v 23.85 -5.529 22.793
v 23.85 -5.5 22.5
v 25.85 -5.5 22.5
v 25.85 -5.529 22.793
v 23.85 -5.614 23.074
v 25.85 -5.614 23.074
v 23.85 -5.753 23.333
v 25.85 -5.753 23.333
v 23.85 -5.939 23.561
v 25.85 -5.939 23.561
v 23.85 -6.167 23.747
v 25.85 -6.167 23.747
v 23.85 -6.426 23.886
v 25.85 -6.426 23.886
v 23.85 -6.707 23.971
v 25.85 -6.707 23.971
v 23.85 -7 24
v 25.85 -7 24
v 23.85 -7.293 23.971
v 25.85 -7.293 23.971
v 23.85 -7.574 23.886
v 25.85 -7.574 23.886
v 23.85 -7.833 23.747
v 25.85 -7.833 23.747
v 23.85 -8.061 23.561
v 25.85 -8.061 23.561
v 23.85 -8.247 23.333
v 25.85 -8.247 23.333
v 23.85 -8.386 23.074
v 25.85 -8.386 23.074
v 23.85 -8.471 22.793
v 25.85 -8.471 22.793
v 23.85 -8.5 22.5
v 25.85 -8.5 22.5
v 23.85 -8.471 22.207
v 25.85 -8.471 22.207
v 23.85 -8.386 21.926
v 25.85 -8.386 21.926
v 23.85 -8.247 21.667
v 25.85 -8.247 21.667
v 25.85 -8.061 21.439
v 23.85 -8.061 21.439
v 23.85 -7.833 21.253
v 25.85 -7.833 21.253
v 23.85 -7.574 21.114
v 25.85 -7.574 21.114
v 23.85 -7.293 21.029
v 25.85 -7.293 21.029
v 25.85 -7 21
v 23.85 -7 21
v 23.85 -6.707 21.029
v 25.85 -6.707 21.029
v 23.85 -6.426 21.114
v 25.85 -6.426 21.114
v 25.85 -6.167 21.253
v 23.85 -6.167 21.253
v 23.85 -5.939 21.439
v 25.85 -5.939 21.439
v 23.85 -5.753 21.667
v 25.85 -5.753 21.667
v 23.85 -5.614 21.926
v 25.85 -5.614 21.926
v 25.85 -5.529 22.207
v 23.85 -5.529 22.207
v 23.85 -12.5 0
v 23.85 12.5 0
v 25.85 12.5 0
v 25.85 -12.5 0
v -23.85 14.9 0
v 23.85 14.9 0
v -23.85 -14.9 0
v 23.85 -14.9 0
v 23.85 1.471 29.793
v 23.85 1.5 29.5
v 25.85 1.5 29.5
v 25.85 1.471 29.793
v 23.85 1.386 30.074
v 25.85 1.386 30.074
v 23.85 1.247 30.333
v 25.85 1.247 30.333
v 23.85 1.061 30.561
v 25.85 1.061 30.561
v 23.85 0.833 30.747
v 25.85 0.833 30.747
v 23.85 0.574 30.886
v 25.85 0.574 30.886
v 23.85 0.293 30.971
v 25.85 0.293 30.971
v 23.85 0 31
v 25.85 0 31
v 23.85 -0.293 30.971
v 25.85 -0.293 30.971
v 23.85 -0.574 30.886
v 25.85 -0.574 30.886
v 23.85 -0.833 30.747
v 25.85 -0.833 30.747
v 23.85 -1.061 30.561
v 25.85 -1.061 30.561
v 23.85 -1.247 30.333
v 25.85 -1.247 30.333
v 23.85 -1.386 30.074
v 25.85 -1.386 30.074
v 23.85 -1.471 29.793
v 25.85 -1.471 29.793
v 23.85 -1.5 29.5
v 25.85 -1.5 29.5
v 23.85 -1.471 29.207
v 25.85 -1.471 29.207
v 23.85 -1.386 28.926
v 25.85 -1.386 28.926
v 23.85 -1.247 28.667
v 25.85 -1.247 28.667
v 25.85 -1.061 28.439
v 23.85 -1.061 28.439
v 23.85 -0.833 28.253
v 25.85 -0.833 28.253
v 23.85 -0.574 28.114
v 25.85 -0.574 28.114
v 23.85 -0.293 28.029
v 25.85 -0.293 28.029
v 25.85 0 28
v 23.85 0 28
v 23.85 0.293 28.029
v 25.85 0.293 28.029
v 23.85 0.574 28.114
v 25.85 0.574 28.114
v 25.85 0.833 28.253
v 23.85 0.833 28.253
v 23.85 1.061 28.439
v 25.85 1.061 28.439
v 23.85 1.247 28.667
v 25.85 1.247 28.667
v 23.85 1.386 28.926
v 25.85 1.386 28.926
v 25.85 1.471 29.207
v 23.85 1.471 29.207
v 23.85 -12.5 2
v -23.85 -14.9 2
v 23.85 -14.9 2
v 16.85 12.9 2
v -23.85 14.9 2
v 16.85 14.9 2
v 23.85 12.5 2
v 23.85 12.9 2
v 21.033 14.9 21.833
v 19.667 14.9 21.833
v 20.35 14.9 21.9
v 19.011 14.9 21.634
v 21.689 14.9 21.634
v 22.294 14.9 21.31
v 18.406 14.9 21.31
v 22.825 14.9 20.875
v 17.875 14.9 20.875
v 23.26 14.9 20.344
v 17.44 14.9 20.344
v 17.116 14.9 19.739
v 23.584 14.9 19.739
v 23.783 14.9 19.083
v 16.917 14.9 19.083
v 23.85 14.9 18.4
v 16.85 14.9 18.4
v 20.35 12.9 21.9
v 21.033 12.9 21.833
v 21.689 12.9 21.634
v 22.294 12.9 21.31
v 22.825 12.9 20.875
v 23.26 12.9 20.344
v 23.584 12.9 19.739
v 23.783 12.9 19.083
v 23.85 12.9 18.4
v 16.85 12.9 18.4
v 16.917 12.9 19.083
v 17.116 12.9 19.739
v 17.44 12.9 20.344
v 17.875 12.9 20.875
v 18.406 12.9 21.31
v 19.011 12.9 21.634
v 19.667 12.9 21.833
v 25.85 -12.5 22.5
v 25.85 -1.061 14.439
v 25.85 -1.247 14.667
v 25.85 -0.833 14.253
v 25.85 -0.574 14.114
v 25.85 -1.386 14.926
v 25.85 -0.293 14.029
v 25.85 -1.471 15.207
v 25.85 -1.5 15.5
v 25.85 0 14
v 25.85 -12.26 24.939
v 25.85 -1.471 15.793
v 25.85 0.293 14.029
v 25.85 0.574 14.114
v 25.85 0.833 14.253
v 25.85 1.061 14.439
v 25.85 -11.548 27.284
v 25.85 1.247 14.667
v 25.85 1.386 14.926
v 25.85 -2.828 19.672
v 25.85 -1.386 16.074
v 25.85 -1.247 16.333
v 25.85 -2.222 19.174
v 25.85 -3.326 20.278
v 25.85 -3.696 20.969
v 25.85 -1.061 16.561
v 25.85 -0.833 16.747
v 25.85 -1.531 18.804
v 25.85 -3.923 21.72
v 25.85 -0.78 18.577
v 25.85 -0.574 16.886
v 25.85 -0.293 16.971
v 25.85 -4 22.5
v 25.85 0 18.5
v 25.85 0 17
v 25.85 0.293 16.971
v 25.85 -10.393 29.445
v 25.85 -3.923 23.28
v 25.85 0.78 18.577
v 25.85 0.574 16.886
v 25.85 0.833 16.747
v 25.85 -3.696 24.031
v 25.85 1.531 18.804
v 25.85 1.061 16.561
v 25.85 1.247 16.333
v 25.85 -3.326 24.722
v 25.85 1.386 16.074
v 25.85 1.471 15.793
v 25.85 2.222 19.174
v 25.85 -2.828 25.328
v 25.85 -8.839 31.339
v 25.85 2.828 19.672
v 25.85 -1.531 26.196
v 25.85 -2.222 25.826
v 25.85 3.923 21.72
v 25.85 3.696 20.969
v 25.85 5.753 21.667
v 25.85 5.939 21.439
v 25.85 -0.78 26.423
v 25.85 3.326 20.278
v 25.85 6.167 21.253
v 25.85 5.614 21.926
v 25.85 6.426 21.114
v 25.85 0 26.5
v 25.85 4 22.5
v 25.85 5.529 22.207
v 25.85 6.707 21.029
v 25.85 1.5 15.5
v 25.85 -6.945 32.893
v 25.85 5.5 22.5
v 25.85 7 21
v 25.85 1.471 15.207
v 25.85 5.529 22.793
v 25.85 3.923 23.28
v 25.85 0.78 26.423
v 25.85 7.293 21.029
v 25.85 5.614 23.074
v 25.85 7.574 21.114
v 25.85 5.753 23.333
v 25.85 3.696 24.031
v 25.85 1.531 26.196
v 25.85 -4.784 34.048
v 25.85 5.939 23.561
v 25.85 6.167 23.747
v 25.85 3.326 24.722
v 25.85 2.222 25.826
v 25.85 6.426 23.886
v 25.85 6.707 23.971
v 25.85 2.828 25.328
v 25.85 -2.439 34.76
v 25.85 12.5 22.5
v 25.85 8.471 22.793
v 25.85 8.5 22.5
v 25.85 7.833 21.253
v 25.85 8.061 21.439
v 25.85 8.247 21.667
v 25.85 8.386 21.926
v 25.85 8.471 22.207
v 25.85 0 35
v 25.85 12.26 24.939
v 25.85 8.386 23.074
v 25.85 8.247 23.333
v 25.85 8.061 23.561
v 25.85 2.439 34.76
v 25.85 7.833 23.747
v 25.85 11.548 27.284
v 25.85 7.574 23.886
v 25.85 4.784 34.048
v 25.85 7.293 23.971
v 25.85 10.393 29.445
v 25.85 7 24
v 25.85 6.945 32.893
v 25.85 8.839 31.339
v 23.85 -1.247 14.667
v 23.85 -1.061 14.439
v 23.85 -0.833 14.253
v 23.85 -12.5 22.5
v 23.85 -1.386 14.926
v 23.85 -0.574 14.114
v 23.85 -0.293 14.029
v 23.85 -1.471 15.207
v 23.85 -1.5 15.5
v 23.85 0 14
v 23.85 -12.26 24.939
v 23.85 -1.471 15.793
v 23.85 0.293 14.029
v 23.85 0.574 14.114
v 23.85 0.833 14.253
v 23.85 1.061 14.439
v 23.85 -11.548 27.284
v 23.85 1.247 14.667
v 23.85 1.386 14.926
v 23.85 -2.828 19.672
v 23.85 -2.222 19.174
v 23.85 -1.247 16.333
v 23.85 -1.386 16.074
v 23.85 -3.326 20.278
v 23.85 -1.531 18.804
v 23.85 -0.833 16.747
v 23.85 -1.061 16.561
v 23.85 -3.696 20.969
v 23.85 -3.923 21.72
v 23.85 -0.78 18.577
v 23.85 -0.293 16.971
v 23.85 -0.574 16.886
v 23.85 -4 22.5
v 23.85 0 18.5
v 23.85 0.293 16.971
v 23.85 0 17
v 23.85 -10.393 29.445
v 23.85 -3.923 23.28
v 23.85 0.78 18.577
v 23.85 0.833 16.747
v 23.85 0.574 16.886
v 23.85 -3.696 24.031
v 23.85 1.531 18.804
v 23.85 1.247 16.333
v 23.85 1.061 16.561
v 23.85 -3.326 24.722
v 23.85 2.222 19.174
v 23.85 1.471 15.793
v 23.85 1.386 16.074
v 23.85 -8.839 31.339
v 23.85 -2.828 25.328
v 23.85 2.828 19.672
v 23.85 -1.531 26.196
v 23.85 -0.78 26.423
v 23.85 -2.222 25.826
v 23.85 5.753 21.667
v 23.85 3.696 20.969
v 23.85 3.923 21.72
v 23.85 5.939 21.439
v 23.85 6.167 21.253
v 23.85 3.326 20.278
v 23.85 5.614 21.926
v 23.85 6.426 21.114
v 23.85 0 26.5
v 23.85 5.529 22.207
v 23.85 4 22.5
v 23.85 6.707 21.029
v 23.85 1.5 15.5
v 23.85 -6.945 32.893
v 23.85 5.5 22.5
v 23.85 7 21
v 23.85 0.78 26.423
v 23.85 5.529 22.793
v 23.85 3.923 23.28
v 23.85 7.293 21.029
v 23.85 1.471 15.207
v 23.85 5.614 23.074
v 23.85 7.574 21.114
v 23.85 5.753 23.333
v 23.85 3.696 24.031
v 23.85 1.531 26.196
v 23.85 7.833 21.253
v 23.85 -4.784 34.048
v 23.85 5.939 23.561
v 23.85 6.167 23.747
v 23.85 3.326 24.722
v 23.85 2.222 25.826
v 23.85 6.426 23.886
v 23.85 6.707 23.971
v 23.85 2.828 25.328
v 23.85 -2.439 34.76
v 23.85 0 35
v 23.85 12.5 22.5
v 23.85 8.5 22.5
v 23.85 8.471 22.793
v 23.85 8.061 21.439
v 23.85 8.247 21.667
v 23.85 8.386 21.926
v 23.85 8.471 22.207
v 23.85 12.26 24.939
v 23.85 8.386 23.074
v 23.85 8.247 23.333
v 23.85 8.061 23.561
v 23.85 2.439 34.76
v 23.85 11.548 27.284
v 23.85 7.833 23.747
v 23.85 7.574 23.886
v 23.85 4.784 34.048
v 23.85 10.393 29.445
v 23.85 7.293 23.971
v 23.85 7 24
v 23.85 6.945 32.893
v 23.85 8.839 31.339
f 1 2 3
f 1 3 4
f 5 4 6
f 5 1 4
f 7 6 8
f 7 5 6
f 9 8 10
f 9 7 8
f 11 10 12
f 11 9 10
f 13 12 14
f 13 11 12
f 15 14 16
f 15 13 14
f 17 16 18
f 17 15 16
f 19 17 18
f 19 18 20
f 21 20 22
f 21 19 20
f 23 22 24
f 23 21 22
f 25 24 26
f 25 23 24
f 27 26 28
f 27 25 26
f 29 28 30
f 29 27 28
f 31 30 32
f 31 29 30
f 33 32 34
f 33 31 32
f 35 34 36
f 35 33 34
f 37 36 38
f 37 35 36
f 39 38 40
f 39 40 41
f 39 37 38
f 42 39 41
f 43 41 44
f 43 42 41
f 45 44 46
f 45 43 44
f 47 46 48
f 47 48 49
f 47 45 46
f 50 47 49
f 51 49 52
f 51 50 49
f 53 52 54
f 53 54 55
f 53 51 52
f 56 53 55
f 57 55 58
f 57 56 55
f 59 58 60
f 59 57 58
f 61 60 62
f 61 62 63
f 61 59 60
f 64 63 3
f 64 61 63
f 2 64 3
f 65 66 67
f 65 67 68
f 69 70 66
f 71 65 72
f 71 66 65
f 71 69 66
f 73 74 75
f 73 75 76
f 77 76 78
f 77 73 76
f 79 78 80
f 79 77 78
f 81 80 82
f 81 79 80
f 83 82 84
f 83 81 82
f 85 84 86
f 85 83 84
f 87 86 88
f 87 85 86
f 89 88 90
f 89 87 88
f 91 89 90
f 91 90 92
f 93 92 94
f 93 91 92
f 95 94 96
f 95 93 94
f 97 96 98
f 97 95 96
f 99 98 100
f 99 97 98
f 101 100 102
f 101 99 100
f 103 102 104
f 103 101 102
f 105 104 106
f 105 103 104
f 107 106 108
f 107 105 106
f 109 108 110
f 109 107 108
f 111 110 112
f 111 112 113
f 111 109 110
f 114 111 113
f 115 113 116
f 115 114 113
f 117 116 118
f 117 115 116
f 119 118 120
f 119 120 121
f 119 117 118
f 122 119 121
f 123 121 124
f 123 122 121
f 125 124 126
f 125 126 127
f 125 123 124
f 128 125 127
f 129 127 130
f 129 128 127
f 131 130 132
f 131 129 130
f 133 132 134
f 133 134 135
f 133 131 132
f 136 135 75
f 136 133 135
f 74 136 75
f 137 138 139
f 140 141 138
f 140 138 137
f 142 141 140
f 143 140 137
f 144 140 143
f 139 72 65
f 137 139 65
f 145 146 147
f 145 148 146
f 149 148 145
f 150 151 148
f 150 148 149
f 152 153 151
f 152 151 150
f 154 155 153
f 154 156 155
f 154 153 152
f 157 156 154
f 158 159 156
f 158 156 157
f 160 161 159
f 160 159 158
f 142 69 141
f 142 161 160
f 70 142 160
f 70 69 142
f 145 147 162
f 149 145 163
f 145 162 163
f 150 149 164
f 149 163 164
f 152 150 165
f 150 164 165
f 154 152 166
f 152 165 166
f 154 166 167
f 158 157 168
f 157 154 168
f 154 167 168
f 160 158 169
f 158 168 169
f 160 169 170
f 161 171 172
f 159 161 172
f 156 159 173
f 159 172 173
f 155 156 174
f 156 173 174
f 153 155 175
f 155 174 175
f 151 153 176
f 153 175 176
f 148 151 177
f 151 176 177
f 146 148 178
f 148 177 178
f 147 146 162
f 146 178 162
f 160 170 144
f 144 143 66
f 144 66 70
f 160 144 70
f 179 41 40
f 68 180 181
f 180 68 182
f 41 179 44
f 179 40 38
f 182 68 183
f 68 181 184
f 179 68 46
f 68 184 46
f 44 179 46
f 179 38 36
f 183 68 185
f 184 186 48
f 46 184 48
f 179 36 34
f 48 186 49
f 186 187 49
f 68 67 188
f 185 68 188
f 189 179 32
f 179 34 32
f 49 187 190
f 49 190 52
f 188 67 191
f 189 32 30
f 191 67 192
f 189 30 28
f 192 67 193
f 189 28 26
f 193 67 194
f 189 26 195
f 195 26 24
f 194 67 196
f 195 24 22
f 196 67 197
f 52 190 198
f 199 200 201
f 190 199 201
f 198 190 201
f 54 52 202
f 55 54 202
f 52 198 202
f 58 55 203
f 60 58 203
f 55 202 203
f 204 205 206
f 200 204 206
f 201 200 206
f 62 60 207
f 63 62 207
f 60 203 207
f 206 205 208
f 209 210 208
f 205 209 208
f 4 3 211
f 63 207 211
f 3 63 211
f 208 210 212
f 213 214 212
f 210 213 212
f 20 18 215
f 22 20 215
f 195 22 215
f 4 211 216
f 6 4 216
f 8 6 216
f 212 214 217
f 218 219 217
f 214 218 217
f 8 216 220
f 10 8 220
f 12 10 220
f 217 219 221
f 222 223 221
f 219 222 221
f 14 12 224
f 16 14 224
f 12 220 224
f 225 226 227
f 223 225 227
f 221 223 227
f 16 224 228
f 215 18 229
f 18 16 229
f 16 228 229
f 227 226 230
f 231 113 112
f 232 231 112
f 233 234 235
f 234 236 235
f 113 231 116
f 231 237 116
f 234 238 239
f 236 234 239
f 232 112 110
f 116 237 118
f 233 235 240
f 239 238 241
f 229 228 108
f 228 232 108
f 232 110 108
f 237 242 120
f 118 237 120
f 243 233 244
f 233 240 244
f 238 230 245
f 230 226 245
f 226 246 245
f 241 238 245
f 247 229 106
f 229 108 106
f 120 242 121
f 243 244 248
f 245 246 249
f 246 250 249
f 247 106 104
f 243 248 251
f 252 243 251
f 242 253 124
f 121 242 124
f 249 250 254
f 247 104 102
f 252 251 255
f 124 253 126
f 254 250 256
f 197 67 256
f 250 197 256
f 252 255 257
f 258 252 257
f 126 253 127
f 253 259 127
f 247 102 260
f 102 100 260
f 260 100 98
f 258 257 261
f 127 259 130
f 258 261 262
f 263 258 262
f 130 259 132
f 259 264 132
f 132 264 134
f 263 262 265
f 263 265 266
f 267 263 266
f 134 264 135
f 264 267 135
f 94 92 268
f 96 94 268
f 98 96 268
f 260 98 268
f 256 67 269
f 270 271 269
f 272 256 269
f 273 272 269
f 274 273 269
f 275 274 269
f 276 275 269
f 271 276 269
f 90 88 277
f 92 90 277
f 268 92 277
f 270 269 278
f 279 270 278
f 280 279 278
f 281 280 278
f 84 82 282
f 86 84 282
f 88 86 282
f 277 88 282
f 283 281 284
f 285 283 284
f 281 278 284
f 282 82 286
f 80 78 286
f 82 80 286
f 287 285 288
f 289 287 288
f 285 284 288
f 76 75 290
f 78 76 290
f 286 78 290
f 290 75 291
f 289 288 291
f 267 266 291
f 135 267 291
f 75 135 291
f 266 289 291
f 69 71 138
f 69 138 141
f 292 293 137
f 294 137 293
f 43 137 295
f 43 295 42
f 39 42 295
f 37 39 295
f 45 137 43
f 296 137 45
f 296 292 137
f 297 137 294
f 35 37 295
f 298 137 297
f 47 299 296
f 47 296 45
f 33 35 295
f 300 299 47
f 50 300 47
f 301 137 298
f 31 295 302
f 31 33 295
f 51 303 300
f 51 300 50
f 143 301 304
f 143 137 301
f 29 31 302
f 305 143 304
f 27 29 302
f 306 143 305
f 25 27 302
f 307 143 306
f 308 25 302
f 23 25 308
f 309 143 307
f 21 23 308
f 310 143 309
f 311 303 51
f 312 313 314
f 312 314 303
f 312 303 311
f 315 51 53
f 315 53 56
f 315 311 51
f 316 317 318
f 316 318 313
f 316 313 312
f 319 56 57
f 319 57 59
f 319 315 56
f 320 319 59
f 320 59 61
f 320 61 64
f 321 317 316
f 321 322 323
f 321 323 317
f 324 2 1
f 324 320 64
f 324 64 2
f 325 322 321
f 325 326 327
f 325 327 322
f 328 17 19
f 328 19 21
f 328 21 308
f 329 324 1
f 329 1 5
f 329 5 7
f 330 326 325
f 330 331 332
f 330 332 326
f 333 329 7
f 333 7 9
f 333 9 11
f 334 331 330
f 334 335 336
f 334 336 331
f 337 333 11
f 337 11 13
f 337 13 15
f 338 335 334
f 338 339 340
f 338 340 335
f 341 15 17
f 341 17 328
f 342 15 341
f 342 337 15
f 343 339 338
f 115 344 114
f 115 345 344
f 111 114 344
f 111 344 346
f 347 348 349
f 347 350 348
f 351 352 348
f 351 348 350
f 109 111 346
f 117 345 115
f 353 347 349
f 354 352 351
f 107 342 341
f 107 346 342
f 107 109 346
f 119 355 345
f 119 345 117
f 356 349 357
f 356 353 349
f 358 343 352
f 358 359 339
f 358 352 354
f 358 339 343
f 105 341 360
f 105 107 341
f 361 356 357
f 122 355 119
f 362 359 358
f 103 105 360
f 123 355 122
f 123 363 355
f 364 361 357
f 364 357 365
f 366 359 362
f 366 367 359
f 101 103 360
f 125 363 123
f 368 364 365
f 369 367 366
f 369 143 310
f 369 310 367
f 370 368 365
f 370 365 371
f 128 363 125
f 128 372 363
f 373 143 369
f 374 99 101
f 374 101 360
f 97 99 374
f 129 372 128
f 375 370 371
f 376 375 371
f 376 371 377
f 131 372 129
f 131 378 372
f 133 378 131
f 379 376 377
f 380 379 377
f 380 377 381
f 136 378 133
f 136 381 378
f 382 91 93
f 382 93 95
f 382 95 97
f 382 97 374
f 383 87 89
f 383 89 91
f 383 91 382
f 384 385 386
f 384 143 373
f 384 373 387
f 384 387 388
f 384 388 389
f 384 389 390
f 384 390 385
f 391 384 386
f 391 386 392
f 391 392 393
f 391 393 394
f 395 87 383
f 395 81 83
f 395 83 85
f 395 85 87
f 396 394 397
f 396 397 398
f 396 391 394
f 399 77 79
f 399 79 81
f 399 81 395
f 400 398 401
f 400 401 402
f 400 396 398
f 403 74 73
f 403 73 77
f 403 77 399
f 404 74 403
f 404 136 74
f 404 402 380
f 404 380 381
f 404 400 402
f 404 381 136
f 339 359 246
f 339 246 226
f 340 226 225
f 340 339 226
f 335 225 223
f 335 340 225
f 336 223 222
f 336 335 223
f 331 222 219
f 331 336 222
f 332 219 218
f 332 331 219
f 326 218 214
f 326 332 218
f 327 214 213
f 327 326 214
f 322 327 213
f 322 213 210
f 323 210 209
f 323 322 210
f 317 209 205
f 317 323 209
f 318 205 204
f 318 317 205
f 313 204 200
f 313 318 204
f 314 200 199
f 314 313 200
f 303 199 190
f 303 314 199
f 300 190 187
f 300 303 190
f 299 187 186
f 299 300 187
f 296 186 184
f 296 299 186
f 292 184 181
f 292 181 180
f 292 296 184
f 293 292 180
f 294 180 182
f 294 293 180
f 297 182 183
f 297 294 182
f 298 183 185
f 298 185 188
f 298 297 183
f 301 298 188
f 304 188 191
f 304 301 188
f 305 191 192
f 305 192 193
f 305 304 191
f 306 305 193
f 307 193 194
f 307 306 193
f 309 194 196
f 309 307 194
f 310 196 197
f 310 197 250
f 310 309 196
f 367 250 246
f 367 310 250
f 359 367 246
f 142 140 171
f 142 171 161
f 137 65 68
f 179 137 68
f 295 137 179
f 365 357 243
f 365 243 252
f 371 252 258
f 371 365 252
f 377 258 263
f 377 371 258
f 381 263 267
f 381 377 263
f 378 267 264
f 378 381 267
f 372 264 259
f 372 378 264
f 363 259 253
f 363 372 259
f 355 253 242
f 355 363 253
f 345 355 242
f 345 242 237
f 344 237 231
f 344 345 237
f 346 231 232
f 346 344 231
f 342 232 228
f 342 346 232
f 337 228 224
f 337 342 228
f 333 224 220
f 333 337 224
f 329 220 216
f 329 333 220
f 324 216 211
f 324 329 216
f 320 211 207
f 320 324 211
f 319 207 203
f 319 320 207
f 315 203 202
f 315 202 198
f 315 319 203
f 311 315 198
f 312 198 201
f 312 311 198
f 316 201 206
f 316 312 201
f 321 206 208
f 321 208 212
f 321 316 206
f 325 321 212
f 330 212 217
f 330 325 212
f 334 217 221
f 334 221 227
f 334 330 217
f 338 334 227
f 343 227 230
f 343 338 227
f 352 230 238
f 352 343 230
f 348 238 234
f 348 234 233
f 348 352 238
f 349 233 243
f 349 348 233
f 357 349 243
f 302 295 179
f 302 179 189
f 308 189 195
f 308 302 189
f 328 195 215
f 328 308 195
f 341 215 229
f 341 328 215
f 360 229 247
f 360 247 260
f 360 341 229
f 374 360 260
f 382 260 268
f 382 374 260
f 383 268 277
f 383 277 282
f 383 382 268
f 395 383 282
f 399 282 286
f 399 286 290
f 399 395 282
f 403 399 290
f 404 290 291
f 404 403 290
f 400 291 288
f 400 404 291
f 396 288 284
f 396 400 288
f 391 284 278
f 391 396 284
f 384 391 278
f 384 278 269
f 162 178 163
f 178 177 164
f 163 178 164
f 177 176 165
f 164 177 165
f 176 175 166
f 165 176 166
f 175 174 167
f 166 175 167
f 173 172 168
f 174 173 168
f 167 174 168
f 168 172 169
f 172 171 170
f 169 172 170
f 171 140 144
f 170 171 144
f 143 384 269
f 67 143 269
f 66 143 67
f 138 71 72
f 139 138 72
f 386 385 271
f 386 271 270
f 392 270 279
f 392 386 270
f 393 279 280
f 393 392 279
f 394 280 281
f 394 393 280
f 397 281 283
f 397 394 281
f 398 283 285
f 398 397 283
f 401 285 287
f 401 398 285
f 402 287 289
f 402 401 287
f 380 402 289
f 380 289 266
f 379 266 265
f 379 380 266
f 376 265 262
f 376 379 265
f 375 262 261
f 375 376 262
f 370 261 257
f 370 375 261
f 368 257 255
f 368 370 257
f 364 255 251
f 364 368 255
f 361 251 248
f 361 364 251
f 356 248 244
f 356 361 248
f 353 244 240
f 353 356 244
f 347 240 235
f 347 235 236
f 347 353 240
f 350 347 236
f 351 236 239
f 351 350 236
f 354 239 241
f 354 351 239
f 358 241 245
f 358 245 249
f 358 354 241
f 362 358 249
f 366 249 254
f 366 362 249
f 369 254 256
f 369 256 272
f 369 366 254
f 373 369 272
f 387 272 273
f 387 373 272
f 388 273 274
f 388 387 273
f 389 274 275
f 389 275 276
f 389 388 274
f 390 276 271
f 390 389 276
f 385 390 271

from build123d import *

# Parameters (mm, degrees)
SKETCH_1_W          = 47.7
SKETCH_1_H          = 29.8
EXTRUDE_1_DEPTH     = 2
SKETCH_2_W          = 7
SKETCH_2_H          = 2
EXTRUDE_3_DEPTH     = 19.9
CUT_EXTRUDE_1_DEPTH = 43.676369339
SKETCH_4_R          = 4
SKETCH_4_R_2        = 1.5
EXTRUDE_4_DEPTH     = 2
SKETCH_5_R          = 4
SKETCH_5_R_2        = 1.5
EXTRUDE_5_DEPTH     = 2


with BuildPart() as part:
    # 스케치1 → 보스-돌출1 (new body)
    with BuildSketch(Plane.XY):
        Rectangle(SKETCH_1_W, SKETCH_1_H)
    extrude(amount=EXTRUDE_1_DEPTH)

    # 스케치2 → 보스-돌출3 (add)
    with BuildSketch(Plane.XY.offset(2)):
        with Locations((20.35, 13.9)):
            Rectangle(SKETCH_2_W, SKETCH_2_H)
    extrude(amount=EXTRUDE_3_DEPTH)

    # 스케치3 → 컷-돌출1 (cut, through all)
    with BuildSketch(Plane.XZ.offset(-12.9)):
        with BuildLine():
            Line((16.85, 21.9), (16.85, 18.4))
            ThreePointArc((16.85, 18.4), (17.875126266, 20.874873734), (20.35, 21.9))
            Line((20.35, 21.9), (16.85, 21.9))
        make_face()
        with BuildLine():
            ThreePointArc((20.35, 21.9), (22.824873734, 20.874873734), (23.85, 18.4))
            Line((23.85, 18.4), (23.85, 21.9))
            Line((23.85, 21.9), (20.35, 21.9))
        make_face()
    extrude(amount=-CUT_EXTRUDE_1_DEPTH, mode=Mode.SUBTRACT)

    # 스케치4 → 보스-돌출4 (add)
    with BuildSketch(Plane(origin=(23.85, 0, 0), x_dir=(0, 0, -1), z_dir=(1, 0, 0))):
        with BuildLine():
            Line((0, 12.5), (0, -12.5))
            Line((0, -12.5), (-22.5, -12.5))
            ThreePointArc((-22.5, -12.5), (-35, 0), (-22.5, 12.5))
            Line((-22.5, 12.5), (0, 12.5))
        make_face()
        with Locations(Location((-22.5, 0, 0), (0, 0, 90))):
            Circle(SKETCH_4_R, mode=Mode.SUBTRACT)
        with Locations(Location((-29.5, 0, 0), (0, 0, 90))):
            Circle(SKETCH_4_R_2, mode=Mode.SUBTRACT)
        with Locations(Location((-22.5, 7, 0), (0, 0, 90))):
            Circle(SKETCH_4_R_2, mode=Mode.SUBTRACT)
        with Locations(Location((-15.5, 0, 0), (0, 0, 90))):
            Circle(SKETCH_4_R_2, mode=Mode.SUBTRACT)
        with Locations(Location((-22.5, -7, 0), (0, 0, 90))):
            Circle(SKETCH_4_R_2, mode=Mode.SUBTRACT)
    extrude(amount=EXTRUDE_4_DEPTH)

    # 스케치5 → 보스-돌출5 (add)
    with BuildSketch(Plane(origin=(23.85, 0, 0), x_dir=(0, 0, -1), z_dir=(1, 0, 0))):
        with BuildLine():
            Line((0, 12.5), (-22.5, 12.5))
            ThreePointArc((-22.5, 12.5), (-35, 0), (-22.5, -12.5))
            Line((-22.5, -12.5), (0, -12.5))
            Line((0, -12.5), (0, 12.5))
        make_face()
        with Locations(Location((-22.5, 0, 0), (0, 0, 90))):
            Circle(SKETCH_5_R, mode=Mode.SUBTRACT)
        with Locations(Location((-15.5, 0, 0), (0, 0, 90))):
            Circle(SKETCH_5_R_2, mode=Mode.SUBTRACT)
        with Locations(Location((-22.5, -7, 0), (0, 0, 90))):
            Circle(SKETCH_5_R_2, mode=Mode.SUBTRACT)
        with Locations(Location((-29.5, 0, 0), (0, 0, 90))):
            Circle(SKETCH_5_R_2, mode=Mode.SUBTRACT)
        with Locations(Location((-22.5, 7, 0), (0, 0, 90))):
            Circle(SKETCH_5_R_2, mode=Mode.SUBTRACT)
    extrude(amount=EXTRUDE_5_DEPTH)


solid = part.part
